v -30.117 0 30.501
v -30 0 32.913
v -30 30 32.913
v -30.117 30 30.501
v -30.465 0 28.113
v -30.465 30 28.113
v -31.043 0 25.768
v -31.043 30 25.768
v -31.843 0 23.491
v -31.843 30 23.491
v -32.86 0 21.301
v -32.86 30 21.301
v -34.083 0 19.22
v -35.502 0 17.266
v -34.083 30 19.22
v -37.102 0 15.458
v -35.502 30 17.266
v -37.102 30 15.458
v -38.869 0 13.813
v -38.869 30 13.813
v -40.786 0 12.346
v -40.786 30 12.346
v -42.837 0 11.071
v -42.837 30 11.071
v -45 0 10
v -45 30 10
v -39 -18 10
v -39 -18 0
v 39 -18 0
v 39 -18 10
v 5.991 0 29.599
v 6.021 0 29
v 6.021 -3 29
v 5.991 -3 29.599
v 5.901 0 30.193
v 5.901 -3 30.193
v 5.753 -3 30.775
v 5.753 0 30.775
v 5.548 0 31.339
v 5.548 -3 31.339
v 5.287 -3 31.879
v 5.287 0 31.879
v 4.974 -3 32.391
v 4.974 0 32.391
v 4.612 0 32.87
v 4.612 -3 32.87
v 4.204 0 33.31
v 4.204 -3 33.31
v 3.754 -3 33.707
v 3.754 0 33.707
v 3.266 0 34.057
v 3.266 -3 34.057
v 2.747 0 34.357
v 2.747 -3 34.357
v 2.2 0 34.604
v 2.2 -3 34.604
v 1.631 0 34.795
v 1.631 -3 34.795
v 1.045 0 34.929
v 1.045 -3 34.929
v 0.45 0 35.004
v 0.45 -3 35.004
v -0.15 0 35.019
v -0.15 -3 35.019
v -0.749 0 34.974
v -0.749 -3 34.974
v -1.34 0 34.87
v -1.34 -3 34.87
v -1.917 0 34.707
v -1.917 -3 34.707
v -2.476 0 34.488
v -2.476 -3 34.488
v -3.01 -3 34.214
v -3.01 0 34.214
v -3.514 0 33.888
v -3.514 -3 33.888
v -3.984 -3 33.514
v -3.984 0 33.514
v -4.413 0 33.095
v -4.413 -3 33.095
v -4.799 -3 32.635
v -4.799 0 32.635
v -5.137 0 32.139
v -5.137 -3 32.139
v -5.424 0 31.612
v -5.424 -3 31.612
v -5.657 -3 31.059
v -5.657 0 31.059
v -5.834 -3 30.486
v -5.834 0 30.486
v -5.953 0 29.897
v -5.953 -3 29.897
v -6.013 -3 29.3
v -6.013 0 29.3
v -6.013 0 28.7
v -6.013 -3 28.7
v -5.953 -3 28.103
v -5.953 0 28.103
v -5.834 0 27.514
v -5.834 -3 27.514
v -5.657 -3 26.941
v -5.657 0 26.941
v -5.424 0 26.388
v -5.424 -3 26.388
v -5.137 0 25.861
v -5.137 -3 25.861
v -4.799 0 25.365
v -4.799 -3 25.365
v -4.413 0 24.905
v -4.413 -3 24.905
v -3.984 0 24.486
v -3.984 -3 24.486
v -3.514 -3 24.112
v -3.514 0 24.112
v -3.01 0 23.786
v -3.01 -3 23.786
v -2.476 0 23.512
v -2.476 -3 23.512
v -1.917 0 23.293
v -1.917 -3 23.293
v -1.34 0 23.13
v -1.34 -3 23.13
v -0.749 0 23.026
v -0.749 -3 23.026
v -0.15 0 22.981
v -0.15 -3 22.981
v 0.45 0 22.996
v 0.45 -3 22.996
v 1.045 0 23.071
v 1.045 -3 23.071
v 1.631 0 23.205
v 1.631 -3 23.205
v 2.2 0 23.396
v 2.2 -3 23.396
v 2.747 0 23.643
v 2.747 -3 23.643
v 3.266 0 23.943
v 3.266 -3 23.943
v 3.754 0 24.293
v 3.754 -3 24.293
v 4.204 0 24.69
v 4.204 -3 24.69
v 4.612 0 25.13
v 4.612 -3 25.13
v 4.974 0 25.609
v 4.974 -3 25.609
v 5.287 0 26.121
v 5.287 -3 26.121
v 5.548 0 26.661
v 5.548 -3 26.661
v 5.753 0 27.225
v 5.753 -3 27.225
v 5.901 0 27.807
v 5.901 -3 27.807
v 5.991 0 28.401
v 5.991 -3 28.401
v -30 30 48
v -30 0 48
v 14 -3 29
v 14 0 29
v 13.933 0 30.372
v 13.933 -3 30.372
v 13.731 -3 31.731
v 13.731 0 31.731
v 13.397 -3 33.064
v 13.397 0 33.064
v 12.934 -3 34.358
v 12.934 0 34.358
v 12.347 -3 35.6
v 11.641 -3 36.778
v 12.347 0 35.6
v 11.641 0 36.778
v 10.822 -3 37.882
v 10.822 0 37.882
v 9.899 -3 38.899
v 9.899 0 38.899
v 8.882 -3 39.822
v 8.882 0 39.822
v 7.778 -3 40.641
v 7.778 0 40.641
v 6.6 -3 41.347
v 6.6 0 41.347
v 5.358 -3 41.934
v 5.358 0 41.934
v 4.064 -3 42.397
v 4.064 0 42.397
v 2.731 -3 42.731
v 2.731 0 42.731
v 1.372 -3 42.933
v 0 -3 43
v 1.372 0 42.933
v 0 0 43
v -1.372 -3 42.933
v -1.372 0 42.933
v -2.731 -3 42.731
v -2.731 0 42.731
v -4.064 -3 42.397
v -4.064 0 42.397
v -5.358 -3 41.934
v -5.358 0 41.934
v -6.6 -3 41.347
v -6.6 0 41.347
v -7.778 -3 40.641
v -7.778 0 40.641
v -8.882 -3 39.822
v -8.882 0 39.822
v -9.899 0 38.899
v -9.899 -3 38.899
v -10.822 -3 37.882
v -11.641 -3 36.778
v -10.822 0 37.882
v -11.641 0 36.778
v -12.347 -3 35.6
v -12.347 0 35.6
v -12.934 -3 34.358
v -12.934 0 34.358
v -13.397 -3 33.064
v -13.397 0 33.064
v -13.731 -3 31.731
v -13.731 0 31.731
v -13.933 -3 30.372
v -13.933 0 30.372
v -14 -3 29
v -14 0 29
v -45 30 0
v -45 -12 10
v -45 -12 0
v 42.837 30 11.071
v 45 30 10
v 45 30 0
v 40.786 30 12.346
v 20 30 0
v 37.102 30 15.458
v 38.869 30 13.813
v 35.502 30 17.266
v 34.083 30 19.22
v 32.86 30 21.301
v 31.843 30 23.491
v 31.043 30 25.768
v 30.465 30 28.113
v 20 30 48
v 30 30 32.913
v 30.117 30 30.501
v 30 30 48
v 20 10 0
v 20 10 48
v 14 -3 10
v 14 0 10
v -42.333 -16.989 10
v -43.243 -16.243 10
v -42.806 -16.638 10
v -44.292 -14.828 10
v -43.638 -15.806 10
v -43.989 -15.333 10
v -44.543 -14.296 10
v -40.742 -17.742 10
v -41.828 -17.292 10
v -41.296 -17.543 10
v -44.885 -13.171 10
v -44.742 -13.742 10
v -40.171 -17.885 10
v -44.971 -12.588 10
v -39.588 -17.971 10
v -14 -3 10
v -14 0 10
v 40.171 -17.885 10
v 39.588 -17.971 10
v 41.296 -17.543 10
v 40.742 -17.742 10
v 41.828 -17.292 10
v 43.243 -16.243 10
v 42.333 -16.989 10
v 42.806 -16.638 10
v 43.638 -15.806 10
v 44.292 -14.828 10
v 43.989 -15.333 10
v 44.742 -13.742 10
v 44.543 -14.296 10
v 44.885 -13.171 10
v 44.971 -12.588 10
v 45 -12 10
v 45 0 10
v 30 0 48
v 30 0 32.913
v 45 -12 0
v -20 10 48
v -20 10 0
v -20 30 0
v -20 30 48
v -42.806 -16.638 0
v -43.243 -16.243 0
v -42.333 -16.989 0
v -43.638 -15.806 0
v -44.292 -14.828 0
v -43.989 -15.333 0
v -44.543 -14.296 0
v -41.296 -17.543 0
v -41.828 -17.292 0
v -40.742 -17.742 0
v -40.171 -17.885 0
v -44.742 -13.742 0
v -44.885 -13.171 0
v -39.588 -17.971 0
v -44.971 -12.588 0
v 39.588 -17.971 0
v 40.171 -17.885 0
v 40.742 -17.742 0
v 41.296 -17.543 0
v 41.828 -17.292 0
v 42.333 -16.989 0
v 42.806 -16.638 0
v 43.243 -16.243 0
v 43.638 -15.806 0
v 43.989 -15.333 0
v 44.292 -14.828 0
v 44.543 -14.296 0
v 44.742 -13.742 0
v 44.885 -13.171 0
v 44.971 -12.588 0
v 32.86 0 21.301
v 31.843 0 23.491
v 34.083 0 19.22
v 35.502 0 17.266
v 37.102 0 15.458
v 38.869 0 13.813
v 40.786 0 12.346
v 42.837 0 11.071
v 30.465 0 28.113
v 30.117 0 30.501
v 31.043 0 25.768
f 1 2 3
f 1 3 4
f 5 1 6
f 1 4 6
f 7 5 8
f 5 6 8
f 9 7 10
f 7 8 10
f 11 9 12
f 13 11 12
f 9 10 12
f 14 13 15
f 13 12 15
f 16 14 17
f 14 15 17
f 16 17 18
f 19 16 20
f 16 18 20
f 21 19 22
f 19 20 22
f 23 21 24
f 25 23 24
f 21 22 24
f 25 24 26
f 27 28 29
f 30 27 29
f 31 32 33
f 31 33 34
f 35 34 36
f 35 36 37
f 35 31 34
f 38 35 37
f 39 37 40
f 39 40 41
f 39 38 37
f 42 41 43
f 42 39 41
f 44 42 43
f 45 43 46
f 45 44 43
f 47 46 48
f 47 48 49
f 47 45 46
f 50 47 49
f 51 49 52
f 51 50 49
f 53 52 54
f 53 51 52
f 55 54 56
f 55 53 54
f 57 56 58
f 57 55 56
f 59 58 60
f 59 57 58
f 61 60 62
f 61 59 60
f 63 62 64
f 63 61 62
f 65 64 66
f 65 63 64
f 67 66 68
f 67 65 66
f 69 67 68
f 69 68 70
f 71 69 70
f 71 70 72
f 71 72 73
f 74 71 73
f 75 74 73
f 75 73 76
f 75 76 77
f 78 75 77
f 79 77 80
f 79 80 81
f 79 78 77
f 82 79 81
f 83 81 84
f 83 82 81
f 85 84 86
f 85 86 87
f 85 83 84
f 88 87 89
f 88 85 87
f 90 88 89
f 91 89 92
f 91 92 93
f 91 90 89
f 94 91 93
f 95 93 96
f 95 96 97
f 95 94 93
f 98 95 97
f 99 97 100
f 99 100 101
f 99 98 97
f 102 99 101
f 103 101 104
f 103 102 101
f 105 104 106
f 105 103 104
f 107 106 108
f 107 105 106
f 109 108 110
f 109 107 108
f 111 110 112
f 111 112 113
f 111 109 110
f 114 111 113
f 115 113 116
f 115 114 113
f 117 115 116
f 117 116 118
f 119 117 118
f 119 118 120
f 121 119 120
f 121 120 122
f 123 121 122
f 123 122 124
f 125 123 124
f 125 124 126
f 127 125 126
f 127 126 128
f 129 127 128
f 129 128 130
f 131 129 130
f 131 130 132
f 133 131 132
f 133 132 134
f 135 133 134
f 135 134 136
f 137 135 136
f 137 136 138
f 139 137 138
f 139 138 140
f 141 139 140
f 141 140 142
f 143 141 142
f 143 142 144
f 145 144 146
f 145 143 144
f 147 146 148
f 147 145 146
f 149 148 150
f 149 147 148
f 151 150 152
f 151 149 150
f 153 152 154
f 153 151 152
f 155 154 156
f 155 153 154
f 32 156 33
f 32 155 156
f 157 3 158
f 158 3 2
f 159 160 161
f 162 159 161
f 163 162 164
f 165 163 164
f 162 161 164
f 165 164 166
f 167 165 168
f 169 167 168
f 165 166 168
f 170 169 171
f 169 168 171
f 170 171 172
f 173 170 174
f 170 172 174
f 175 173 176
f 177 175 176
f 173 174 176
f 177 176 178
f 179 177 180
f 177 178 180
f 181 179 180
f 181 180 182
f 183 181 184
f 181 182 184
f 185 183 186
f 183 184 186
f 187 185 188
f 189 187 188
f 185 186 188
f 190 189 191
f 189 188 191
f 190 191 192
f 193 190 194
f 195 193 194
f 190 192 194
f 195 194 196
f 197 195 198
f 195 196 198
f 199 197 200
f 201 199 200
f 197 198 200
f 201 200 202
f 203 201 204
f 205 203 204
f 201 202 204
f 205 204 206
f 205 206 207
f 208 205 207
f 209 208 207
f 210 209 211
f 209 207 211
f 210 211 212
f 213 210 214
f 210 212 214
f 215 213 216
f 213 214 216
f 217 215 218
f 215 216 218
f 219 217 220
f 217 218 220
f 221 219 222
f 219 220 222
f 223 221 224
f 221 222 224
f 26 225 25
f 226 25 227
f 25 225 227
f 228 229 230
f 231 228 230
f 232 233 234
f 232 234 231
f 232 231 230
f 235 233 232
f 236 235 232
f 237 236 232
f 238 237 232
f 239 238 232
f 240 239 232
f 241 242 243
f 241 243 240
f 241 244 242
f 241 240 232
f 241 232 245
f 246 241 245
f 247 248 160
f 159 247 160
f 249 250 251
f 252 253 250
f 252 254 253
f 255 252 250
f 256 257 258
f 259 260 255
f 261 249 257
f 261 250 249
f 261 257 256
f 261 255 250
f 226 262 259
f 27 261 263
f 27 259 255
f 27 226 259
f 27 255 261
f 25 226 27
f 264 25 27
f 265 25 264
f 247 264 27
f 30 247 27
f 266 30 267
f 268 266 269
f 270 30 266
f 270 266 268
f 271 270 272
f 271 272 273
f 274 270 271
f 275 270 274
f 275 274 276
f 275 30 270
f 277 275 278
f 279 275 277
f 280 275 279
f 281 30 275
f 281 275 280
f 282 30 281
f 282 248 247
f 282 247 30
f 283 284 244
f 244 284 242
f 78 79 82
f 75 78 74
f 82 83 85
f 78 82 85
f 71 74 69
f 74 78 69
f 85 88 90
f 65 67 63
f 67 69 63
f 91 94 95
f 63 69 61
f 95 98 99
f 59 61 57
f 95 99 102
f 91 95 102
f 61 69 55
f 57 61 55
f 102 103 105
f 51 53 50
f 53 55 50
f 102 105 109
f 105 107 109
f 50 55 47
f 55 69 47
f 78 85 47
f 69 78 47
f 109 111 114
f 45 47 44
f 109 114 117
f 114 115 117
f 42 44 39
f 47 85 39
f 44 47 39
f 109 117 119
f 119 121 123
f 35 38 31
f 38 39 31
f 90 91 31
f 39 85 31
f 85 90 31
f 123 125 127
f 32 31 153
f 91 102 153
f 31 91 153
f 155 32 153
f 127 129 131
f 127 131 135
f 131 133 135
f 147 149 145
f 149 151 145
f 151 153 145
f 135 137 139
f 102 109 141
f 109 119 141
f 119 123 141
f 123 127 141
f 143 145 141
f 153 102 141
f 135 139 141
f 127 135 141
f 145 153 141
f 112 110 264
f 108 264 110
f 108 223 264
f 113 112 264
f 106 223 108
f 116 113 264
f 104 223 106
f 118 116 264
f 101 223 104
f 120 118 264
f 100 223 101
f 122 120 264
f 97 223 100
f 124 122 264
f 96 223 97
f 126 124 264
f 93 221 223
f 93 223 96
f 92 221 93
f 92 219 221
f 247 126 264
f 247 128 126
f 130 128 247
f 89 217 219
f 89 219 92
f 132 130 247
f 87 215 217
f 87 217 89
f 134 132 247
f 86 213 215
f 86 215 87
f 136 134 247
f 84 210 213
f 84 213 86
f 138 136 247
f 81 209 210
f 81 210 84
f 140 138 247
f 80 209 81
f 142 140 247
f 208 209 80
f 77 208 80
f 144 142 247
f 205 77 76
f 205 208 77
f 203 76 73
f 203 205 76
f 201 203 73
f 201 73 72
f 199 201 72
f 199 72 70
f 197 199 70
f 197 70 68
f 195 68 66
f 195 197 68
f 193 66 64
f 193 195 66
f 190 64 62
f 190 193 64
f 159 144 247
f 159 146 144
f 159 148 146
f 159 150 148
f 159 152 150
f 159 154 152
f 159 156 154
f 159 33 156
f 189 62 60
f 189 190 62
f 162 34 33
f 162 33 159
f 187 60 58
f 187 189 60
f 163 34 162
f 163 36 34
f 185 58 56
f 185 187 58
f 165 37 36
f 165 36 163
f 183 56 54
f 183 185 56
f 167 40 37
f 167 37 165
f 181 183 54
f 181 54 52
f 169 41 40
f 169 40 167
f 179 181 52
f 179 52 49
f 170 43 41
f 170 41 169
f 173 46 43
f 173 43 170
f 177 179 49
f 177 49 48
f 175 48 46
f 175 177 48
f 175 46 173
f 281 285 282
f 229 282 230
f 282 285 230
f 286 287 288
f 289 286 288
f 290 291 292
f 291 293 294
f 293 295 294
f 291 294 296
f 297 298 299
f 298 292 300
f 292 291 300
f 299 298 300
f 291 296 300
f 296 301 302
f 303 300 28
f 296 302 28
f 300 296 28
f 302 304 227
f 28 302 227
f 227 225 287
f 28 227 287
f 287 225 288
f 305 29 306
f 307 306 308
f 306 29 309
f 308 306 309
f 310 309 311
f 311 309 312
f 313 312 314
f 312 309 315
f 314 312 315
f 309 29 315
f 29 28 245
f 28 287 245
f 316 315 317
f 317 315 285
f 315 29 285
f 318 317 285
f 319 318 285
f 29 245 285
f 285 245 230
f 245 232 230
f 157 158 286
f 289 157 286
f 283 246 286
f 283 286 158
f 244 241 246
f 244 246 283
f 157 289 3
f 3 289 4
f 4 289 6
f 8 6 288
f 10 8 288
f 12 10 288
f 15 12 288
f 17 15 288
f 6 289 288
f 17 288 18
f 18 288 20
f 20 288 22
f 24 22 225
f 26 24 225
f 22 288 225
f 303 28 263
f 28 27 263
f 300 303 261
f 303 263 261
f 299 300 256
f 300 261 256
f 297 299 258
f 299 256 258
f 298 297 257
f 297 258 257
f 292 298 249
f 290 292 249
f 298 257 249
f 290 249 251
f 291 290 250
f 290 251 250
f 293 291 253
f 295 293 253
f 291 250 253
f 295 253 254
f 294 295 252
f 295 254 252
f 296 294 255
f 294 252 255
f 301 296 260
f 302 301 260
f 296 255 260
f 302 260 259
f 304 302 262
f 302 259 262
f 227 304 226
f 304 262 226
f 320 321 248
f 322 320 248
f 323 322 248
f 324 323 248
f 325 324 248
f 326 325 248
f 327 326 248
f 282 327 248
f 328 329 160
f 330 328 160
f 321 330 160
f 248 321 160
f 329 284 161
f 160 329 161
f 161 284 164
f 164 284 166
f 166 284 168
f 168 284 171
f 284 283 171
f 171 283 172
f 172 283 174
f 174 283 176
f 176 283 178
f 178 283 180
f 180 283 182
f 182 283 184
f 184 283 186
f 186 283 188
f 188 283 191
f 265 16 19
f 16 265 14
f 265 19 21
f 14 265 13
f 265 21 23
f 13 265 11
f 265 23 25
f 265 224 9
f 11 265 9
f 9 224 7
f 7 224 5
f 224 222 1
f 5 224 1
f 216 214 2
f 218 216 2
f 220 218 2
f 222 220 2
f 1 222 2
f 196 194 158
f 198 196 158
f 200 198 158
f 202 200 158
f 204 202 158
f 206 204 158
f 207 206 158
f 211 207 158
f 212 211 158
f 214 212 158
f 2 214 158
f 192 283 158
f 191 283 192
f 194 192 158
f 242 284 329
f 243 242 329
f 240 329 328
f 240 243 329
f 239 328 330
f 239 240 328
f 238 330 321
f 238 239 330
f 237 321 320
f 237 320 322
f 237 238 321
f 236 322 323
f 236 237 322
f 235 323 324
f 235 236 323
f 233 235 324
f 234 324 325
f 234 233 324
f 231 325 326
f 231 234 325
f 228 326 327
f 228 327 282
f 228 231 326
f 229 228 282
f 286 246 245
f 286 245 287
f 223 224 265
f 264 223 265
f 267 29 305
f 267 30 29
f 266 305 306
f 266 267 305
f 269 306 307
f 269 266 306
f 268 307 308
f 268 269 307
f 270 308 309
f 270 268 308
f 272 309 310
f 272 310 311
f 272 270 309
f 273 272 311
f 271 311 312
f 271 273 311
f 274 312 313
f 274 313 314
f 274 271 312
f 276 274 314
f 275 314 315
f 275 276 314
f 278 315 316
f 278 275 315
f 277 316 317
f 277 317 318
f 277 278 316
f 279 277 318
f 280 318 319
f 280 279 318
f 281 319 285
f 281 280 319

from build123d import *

# Parameters (mm, degrees)
F1_DEPTH    = 48
F2_DEPTH    = 10
F3_R        = 6.0205101074
F4_DEPTH    = 3
F5_T1_DEPTH = 30
F6_R        = 6


# Not quite as in the source:
# - a fillet or chamfer that OpenCascade refuses, or shapes differently, is made with other operations: its cross-section is extruded or revolved along the edge and cut away or added


with BuildPart() as f1:
    # F0 (on Top) → F1 (new body)
    with BuildSketch(Plane.XY):
        Polygon((20, 10), (0, 10), (-20, 10), (-20, 30), (-30, 30), (-30, 0), (0, 0), (30, 0), (30, 30), (20, 30), align=None)
    extrude(amount=F1_DEPTH)

    # F0 (on Top) → F2 (join)
    with BuildSketch(Plane.XY):
        Polygon((20, 10), (0, 10), (-20, 10), (-20, 30), (-30, 30), (-30, 0), (0, 0), (30, 0), (30, 30), (20, 30), align=None)
        Polygon((-30, 0), (-30, 30), (-45, 30), (-45, -18), (0, -18), (45, -18), (45, 30), (30, 30), (30, 0), (0, 0), align=None)
    extrude(amount=F2_DEPTH)

    # F3 (on Front) → F4 (join)
    with BuildSketch(Plane.XZ):
        with BuildLine():
            Line((14, 10), (14, 29))
            ThreePointArc((14, 29), (0, 43), (-14, 29))
            Line((-14, 29), (-14, 10))
            Line((-14, 10), (14, 10))
        make_face()
        with Locations((0, 29)):
            Circle(F3_R, mode=Mode.SUBTRACT)
    extrude(amount=F4_DEPTH)

    # F5: fillet of radius 25 on 2 edges, made by hand

    # F5_s2 → F5_t1 (join)
    with BuildSketch(Plane.XZ.offset(-30)):
        with BuildLine():
            ThreePointArc((30, 32.9128784748), (34.0834993366, 19.2198145372), (45, 10))
            Line((45, 10), (30, 10))
            Line((30, 10), (30, 32.9128784748))
        make_face()
        with BuildLine():
            ThreePointArc((-30, 32.9128784748), (-34.0834993366, 19.2198145372), (-45, 10))
            Line((-45, 10), (-30, 10))
            Line((-30, 10), (-30, 32.9128784748))
        make_face()
    extrude(amount=F5_T1_DEPTH)

    # F6
    f6_edges = [f1.edges().sort_by_distance(p)[0] for p in [
        (-45, -18, 5),
        (45, -18, 5),
    ]]
    fillet(f6_edges, radius=F6_R)


solid = f1.part
